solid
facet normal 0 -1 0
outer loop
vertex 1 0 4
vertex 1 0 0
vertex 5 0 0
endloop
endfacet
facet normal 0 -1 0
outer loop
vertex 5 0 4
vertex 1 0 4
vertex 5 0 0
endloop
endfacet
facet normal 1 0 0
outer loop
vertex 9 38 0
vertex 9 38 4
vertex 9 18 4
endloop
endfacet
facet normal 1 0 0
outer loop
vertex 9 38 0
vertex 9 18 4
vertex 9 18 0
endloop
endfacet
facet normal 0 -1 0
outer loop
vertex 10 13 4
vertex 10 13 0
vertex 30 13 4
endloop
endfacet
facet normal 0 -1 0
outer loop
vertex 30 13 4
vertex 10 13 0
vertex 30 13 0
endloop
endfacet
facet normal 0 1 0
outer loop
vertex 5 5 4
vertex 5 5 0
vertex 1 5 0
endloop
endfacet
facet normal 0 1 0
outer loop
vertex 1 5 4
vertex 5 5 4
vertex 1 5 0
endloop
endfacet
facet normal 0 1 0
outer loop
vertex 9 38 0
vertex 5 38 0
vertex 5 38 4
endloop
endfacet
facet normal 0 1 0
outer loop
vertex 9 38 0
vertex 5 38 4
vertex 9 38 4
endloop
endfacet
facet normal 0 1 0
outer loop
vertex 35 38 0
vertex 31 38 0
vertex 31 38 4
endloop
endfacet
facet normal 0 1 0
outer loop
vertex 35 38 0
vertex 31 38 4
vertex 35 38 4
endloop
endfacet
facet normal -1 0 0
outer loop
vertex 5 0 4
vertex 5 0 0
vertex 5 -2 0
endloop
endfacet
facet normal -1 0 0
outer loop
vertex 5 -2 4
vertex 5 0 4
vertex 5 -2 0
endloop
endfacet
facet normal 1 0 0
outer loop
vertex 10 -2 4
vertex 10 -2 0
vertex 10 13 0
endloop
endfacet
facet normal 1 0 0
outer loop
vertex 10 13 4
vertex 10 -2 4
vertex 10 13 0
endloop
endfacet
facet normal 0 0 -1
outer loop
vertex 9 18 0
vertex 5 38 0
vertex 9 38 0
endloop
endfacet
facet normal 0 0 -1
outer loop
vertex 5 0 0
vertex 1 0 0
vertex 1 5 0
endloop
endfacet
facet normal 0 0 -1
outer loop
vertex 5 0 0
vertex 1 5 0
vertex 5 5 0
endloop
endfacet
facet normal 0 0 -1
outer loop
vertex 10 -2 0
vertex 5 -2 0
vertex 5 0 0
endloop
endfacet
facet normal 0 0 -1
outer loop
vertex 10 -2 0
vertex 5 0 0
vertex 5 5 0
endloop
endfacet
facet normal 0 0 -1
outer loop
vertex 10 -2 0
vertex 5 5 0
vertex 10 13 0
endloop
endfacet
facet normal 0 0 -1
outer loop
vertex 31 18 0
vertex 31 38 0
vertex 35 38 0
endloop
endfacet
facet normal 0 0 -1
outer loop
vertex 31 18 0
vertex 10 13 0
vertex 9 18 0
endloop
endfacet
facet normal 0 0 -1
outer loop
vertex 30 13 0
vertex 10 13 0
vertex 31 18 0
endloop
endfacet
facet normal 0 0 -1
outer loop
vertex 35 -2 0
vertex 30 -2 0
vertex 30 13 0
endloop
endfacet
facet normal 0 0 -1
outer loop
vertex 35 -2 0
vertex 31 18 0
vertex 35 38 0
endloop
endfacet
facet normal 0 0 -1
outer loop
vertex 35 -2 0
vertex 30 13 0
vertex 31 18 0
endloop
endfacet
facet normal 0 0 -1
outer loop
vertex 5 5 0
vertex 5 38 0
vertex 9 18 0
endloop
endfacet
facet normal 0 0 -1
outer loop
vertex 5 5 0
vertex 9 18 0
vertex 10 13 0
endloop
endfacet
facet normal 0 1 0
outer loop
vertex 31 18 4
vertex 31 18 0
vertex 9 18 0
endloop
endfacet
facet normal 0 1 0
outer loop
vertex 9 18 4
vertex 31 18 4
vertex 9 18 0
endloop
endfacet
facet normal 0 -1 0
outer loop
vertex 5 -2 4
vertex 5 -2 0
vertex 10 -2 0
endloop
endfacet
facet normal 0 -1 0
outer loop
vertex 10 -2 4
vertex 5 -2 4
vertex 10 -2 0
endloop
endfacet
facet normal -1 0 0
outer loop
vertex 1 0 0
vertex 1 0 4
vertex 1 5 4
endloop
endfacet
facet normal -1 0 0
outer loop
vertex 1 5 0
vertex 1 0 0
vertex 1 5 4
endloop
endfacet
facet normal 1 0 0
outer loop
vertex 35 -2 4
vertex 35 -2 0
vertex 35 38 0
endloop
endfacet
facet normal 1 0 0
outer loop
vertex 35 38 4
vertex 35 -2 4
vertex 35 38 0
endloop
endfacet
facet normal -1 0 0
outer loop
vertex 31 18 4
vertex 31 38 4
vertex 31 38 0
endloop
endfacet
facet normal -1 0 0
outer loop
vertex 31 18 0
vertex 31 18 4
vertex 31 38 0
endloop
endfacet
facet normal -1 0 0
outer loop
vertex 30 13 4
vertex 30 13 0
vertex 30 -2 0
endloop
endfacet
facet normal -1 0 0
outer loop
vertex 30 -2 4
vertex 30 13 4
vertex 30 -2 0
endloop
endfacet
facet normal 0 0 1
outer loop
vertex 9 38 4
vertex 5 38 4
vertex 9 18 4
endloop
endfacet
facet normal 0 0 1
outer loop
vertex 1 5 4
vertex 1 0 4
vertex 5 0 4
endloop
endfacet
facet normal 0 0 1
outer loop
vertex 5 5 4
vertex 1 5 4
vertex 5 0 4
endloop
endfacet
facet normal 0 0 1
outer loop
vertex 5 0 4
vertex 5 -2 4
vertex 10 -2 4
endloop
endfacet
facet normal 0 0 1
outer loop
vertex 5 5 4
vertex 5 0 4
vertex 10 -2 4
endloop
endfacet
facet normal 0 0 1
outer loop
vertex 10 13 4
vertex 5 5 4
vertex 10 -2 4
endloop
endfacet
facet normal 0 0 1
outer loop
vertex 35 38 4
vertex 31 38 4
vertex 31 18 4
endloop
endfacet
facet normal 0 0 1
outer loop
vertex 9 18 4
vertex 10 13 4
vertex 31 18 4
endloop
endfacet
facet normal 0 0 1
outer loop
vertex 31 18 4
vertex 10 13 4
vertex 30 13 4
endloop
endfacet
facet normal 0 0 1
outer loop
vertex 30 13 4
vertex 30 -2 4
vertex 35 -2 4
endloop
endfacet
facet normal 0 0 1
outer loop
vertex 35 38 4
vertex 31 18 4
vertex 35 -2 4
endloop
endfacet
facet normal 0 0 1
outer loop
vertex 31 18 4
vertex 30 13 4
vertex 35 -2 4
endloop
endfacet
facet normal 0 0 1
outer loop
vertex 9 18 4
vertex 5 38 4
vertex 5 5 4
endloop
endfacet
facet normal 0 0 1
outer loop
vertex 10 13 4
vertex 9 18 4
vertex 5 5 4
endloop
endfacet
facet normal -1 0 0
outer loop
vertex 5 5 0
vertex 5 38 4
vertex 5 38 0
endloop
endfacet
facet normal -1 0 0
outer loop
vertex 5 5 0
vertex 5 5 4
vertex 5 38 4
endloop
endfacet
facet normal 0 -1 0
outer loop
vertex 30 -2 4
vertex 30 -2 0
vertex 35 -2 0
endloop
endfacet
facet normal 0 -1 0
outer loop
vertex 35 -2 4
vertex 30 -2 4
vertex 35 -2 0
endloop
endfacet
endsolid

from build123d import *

# Parameters (mm, degrees)
P_IDAT_VYSUNUT_M1_DEPTH  = 4
SKICA2_W                 = 20
SKICA2_H                 = 4
P_IDAT_VYSUNUT_M2_DEPTH  = 15
SKICA3_W                 = 5.5
SKICA3_H                 = 3
ODEBRAT_VYSUNUT_M1_DEPTH = 15
SKICA4_W                 = 20
SKICA4_H                 = 15
ODEBRAT_VYSUNUT_M2_DEPTH = 15
SKICA5_W                 = 4
SKICA5_H                 = 4
P_IDAT_VYSUNUT_M3_DEPTH  = 20
SKICA6_W                 = 1
SKICA6_H                 = 5
ODEBRAT_VYSUNUT_M3_DEPTH = 10


with BuildPart() as part:
    # Skica1 → Přidat vysunutím1 (new body)
    with BuildSketch(Plane.XY):
        Polygon((0, 0), (5, 0), (5, -2), (10, -2), (10, 4.082474227), (10, 13), (30, 13), (30, -2), (35, -2), (35, 18), (5, 18), (5, 5), (0, 5), align=None)
    extrude(amount=P_IDAT_VYSUNUT_M1_DEPTH)

    # Skica2 → Přidat vysunutím2 (add)
    with BuildSketch(Plane(origin=(0, 18, 0), x_dir=(1, 0, 0), z_dir=(0, 1, 0))):
        with Locations((20, -2)):
            Rectangle(SKICA2_W, SKICA2_H)
    extrude(amount=P_IDAT_VYSUNUT_M2_DEPTH)

    # Skica3 → Odebrat vysunutím1 (cut)
    with BuildSketch(Plane.XY.offset(4)):
        with Locations((20, 28)):
            Rectangle(SKICA3_W, SKICA3_H)
    extrude(amount=-ODEBRAT_VYSUNUT_M1_DEPTH, mode=Mode.SUBTRACT)

    # Skica4 → Odebrat vysunutím2 (cut)
    with BuildSketch(Plane.XY.offset(4)):
        with Locations((20, 25.5)):
            Rectangle(SKICA4_W, SKICA4_H)
    extrude(amount=-ODEBRAT_VYSUNUT_M2_DEPTH, mode=Mode.SUBTRACT)

    # Skica5 → Přidat vysunutím3 (add)
    with BuildSketch(Plane(origin=(0, 18, 0), x_dir=(1, 0, 0), z_dir=(0, 1, 0))):
        with Locations((7, -2)):
            Rectangle(SKICA5_W, SKICA5_H)
        with Locations((33, -2)):
            Rectangle(SKICA5_W, SKICA5_H)
    extrude(amount=P_IDAT_VYSUNUT_M3_DEPTH)

    # Skica6 → Odebrat vysunutím3 (cut)
    with BuildSketch(Plane.XY.offset(4)):
        with Locations((0.5, 2.5)):
            Rectangle(SKICA6_W, SKICA6_H)
    extrude(amount=-ODEBRAT_VYSUNUT_M3_DEPTH, mode=Mode.SUBTRACT)


solid = part.part
